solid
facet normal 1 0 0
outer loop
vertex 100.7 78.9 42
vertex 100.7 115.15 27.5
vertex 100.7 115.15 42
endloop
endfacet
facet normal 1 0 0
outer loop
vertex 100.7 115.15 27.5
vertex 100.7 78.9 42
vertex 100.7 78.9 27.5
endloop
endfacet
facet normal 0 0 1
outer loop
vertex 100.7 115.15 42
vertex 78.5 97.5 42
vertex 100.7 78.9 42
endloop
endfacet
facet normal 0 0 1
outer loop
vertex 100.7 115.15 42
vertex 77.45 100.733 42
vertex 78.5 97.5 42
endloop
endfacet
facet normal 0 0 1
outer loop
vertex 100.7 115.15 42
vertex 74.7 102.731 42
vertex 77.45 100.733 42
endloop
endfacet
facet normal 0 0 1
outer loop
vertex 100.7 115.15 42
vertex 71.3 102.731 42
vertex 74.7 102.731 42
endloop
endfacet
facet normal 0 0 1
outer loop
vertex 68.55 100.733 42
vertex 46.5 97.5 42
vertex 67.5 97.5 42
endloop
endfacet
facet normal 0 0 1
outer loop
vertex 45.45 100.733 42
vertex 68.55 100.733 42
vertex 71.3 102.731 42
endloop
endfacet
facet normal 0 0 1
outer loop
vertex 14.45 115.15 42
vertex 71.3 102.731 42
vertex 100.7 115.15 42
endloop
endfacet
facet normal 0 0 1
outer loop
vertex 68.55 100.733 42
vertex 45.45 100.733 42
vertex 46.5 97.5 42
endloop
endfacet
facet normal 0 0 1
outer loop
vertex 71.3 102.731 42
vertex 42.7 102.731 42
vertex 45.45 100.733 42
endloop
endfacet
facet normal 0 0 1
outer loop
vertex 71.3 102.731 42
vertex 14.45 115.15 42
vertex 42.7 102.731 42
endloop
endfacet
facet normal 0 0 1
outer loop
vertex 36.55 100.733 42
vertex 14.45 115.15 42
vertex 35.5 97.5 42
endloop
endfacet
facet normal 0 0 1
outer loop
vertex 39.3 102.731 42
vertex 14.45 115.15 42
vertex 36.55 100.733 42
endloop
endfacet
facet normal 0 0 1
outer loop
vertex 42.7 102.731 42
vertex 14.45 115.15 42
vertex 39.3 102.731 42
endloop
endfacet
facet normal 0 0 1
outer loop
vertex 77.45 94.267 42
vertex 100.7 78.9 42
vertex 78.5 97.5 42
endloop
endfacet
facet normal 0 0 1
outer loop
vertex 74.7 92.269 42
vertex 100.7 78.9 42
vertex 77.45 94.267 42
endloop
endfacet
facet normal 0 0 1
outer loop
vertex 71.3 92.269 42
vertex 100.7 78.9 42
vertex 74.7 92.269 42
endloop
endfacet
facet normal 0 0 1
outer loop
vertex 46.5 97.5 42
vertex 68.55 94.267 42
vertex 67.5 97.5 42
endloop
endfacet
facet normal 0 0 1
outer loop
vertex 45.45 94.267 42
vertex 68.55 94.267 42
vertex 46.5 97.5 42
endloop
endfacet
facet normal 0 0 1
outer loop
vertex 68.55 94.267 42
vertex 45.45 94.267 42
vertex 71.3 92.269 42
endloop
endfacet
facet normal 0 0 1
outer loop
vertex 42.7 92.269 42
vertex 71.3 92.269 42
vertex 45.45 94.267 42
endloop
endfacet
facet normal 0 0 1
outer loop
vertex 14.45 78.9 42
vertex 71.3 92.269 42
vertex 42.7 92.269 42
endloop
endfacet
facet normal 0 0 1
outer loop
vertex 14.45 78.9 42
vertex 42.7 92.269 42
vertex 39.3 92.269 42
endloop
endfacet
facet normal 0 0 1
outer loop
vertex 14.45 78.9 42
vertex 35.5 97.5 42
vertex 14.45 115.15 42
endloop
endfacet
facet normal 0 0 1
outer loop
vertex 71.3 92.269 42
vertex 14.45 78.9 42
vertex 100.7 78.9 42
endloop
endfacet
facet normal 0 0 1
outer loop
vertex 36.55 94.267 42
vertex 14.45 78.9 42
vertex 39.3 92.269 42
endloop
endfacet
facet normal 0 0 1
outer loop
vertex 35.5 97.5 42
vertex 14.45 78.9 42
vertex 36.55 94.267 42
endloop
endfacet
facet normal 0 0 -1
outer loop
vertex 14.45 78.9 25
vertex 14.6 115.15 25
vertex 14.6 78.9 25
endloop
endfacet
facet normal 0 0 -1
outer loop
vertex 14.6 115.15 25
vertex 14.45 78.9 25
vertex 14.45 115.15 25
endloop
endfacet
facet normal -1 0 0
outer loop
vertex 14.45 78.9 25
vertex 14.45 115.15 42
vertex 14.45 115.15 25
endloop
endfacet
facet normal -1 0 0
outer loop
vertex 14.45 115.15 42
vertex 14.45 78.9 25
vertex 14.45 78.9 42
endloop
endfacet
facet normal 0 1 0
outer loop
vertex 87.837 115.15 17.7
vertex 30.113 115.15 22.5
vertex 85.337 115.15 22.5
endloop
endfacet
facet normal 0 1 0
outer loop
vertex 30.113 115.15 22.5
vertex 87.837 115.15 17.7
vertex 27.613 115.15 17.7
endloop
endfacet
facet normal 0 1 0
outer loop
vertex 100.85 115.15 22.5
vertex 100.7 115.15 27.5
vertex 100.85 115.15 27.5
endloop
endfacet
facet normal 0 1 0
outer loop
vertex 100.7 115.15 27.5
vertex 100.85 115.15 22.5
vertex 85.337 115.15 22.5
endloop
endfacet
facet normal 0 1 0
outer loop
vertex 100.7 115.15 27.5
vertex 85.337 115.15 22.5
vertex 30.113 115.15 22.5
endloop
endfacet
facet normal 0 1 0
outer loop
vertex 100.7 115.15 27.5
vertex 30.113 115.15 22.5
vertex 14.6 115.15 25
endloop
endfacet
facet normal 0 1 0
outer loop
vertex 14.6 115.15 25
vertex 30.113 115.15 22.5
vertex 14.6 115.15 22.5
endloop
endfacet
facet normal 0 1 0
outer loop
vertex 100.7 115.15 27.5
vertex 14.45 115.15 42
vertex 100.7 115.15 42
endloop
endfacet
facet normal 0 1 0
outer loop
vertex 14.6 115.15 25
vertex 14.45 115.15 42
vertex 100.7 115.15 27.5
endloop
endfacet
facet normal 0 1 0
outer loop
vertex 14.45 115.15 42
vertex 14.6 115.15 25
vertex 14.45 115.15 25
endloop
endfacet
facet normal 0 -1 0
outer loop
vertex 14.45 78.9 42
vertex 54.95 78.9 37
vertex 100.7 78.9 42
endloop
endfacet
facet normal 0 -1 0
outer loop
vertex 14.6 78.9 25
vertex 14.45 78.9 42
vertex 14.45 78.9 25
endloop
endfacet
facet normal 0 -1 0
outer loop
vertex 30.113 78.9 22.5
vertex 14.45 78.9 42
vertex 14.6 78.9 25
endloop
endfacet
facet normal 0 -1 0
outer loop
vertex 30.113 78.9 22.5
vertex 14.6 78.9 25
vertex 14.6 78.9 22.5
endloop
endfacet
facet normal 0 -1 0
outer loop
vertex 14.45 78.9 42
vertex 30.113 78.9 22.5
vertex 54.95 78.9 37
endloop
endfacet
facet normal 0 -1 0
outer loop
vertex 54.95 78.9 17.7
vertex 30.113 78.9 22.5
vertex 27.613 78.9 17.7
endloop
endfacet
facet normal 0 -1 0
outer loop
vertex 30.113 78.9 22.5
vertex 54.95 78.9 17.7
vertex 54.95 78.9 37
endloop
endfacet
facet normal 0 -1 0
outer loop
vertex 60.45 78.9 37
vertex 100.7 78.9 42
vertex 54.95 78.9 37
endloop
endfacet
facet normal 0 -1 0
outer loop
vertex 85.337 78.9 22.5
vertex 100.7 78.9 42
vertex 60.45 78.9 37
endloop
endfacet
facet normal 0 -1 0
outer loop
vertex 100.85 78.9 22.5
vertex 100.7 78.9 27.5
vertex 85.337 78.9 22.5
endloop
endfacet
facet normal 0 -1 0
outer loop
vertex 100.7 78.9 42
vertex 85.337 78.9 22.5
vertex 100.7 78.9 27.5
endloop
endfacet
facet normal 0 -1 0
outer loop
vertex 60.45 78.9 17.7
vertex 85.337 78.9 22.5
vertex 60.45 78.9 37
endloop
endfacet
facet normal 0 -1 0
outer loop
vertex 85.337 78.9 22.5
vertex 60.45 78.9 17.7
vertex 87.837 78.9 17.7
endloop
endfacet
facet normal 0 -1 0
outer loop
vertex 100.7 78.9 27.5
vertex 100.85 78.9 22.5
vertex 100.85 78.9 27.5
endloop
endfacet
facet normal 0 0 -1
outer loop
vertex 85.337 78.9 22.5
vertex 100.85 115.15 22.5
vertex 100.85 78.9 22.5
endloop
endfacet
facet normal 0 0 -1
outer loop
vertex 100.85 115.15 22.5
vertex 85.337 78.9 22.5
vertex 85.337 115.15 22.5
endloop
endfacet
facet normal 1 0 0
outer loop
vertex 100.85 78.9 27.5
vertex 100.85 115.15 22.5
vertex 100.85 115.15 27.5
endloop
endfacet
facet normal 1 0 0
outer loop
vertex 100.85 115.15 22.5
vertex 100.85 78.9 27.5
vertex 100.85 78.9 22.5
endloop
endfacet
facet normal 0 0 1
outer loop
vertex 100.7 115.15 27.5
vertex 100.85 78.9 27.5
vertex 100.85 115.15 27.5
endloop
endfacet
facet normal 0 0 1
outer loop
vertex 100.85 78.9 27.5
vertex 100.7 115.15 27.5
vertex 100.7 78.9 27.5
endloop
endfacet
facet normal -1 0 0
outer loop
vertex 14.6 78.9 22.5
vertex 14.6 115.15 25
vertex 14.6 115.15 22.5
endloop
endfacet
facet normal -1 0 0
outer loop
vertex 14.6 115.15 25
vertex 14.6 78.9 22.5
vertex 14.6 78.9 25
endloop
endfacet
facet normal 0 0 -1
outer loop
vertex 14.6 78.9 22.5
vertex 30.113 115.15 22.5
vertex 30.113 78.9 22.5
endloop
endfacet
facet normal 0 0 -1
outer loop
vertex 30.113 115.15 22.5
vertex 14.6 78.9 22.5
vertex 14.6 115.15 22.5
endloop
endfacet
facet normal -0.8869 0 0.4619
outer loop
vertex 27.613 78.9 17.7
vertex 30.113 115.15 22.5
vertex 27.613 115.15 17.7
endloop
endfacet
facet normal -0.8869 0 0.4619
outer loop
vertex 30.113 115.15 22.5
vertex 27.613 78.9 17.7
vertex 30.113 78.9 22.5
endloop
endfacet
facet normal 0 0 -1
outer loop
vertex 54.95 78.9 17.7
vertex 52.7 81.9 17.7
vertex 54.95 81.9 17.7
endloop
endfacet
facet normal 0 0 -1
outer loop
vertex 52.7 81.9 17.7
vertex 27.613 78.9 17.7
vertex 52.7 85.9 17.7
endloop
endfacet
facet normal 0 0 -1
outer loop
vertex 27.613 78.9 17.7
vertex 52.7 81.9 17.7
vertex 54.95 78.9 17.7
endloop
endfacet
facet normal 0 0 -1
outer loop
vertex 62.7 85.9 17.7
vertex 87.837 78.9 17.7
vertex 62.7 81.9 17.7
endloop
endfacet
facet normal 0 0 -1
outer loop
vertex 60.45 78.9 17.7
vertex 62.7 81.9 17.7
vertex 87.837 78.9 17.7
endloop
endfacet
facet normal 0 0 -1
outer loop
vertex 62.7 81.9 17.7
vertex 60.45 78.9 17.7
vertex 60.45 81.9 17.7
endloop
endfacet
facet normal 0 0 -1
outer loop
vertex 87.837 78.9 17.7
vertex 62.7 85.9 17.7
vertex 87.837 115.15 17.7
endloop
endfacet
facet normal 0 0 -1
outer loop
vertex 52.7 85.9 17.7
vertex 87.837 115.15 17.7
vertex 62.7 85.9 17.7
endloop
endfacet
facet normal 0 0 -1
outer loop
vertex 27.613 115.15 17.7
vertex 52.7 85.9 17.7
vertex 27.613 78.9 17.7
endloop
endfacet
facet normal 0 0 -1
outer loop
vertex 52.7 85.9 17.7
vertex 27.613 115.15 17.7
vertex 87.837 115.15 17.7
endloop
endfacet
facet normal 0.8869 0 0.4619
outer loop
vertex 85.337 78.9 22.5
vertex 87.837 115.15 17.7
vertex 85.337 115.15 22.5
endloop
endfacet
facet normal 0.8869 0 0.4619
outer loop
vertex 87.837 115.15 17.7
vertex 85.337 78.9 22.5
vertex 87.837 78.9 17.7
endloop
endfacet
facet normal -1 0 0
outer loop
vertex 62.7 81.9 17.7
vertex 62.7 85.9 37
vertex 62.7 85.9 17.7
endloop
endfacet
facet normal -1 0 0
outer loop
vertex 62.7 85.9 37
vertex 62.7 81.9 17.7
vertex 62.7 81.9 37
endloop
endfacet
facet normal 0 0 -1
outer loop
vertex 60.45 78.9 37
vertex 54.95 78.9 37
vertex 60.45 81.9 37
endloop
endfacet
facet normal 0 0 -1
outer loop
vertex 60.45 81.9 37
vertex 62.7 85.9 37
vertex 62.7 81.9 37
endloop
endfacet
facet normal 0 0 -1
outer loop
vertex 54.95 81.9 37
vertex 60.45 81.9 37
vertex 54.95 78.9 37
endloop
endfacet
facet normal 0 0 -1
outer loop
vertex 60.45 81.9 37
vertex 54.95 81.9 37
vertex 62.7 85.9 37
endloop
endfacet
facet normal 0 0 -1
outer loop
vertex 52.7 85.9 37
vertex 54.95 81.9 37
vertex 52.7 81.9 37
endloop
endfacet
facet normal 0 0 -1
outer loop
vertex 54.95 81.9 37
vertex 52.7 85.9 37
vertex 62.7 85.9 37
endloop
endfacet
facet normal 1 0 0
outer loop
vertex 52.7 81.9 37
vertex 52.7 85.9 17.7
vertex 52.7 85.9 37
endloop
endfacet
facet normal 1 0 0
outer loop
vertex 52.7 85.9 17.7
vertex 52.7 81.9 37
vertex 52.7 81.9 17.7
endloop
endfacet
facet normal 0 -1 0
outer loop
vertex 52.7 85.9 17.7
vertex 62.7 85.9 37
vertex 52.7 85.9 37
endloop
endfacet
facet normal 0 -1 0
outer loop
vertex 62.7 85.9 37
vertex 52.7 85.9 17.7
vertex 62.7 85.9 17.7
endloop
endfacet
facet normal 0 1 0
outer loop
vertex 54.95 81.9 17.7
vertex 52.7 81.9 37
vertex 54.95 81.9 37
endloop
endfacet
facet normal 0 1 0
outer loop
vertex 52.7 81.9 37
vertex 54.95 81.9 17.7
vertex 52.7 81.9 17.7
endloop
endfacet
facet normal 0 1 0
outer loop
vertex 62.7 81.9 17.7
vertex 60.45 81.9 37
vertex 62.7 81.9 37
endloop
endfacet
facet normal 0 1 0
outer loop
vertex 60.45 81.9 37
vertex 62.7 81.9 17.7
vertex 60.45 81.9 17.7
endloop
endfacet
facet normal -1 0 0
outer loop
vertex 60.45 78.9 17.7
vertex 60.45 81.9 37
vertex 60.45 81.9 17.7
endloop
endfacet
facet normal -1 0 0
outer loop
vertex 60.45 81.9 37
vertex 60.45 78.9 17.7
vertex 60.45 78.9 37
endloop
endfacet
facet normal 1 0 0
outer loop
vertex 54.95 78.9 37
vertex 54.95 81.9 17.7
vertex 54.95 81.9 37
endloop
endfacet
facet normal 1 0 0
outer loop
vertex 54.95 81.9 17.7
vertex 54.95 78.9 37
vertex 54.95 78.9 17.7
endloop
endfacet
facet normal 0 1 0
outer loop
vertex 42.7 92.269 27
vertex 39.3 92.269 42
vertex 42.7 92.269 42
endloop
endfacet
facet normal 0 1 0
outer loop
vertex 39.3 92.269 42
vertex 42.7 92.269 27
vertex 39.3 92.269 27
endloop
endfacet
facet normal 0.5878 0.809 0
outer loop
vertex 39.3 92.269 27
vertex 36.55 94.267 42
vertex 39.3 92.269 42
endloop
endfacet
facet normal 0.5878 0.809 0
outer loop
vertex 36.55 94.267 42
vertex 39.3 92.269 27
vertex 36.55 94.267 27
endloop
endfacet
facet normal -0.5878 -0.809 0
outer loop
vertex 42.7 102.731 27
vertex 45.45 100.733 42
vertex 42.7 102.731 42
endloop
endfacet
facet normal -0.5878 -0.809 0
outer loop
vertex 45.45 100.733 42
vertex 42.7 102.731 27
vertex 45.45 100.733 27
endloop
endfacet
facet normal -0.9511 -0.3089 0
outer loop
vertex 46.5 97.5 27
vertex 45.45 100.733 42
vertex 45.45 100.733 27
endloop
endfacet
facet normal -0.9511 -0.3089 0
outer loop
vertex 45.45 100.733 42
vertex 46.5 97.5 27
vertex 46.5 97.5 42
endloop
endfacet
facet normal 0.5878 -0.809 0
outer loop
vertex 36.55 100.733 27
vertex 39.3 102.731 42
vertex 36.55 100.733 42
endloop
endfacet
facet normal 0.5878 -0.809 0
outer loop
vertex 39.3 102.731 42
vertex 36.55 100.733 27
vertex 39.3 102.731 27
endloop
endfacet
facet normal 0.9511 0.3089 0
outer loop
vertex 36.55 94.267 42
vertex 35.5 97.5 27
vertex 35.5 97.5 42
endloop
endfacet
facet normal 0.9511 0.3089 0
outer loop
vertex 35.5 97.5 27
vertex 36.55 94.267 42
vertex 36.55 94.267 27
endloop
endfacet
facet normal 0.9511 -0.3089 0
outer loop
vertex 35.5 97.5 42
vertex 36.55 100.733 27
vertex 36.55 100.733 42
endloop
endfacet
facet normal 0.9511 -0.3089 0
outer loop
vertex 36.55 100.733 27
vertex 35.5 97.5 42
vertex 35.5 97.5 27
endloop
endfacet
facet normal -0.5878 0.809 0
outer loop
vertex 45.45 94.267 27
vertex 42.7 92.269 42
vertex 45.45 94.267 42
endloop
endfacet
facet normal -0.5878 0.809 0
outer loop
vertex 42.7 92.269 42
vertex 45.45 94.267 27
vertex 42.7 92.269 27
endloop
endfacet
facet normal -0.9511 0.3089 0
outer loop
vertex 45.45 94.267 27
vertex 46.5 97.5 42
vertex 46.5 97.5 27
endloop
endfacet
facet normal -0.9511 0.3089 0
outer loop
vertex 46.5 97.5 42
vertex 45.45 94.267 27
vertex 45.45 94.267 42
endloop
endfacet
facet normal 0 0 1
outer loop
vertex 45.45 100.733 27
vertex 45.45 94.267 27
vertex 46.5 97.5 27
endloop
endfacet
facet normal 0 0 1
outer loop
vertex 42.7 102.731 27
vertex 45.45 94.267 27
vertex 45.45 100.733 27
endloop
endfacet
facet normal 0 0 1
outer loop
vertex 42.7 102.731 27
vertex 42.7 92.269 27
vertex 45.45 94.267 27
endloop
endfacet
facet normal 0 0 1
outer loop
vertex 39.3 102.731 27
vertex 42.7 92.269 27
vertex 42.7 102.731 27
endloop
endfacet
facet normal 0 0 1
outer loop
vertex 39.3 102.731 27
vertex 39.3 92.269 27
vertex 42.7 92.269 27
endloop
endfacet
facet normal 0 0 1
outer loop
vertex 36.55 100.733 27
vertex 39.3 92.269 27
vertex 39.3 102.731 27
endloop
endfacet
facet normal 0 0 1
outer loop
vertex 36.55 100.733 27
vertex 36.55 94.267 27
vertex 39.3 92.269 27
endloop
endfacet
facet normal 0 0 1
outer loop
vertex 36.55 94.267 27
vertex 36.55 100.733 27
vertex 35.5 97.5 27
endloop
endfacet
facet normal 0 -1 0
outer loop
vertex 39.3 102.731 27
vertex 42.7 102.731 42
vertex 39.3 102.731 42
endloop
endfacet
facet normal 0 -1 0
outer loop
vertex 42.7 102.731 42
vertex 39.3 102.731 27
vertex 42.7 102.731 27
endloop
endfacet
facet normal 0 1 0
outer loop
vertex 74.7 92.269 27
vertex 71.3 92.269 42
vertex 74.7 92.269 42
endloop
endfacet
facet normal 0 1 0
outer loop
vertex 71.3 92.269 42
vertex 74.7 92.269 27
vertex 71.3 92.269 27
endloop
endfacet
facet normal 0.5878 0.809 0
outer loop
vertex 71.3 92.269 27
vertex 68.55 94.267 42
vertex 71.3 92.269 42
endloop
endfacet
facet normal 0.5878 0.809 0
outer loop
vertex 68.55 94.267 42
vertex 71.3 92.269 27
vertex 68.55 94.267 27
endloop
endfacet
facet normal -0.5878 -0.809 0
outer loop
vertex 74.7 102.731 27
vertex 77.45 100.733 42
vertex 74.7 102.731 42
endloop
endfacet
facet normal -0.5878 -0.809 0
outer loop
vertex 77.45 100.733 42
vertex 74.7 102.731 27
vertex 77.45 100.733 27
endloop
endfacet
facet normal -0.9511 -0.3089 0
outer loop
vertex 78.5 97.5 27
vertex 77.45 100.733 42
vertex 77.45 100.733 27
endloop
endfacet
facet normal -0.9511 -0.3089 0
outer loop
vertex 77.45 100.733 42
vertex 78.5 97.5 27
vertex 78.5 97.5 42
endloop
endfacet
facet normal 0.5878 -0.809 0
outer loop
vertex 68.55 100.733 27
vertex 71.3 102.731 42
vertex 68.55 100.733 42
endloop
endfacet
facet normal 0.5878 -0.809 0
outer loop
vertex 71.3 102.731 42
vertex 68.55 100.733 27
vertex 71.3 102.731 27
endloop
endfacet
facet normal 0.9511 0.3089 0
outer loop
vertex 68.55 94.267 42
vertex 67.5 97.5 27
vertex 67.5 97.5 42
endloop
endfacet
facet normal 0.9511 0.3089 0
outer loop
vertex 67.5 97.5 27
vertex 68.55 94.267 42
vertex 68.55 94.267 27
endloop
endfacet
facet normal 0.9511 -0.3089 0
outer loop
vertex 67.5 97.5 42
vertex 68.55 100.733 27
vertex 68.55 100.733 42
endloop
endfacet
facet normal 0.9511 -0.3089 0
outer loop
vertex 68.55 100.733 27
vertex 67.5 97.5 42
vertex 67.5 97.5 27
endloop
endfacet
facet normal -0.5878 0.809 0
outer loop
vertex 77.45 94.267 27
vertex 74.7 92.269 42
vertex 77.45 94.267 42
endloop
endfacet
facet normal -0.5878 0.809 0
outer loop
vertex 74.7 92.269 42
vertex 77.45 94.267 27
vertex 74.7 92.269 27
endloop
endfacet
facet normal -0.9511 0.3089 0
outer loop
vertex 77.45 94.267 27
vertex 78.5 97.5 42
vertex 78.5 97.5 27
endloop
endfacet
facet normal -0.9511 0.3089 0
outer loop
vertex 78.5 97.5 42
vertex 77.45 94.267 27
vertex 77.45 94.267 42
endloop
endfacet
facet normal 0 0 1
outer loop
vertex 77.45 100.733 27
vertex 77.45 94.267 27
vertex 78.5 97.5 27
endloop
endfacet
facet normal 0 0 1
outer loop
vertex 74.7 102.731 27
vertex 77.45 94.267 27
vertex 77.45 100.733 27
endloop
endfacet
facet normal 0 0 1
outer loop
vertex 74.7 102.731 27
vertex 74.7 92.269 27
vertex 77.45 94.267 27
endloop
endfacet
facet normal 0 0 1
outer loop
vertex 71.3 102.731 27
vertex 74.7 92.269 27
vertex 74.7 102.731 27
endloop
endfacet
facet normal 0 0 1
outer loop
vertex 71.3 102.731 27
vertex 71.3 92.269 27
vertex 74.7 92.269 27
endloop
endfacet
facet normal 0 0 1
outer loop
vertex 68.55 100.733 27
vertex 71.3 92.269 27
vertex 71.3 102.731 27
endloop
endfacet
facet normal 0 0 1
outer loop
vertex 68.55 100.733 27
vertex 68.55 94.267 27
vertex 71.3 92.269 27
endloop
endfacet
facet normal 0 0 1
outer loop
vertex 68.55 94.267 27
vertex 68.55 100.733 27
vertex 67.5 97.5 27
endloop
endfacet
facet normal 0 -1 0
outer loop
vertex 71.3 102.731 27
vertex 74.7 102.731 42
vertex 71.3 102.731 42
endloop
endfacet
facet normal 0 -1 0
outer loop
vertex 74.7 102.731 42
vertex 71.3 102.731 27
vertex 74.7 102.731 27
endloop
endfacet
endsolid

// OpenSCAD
//-----Rabo de Andorinha Cima (Eixo Y) / Rabo de Andorinha Baixo (Eixo X)-----//

//-----Declaração de Variáveis-----//
r=3;
d=25;
h=9;
nx=5;
ny=5;
geo=1;
res=10;
aux=2*d+15.15;
aux2=40.7-24.2+111.70-16.7-5.15/2;
aux3=11/2;
aux4=(37.55+4)/2 - (16.35+5.1/2-13.2);
cc=25;
ff=37.5;
gg=0.2;
shift=(17.5+2*d)/2;
shift2=(17.5)/2;
h_alt=11/2;
hip=h_alt/(sin(60));
o_ext=d*0.75+2*shift; // Segundo rabo de andorinha
o_ext2=2*shift2+d*0.75; //Primeiro rabo de andorinha

//-----Declaração de Funções-----//
module funcao_2d_array_cilindros(r,d,h,nx,ny,geo,res){
    //-----FUNÇÃO ARRAY 2D DE CILÍNDROS-----//
    /*
    Forneça:
        raio dos cilíndros: r
        distância entre os centros de cada cilíndro: d
        altura dos cilíndros: h
        quantidade de cilíndros em ambas as direções: nx, ny
        resolução dos cilíndros: res
    Selecione a geometria:
         Retangular: 1
         Hexagonal: 2
    
    Quantidade de cilíndros = nx*ny
    geo=1 => Dimensões: [(nx-1)*d+2*r,(ny-1)*d+2*r,h]
    geo=2 => Dimensões: [(nx-1+cos(60))*d+2*r,(ny-1)*d*sin(60)+2*r,h]
    */
    if (d<2*r){
        text("Error!");
        translate([0,-15,0])text("Verify your specified dimensions.");
    }else{
        if(geo==1){
            for(j=[0:1:ny-1]){
                for(i=[0:1:nx-1]){
                    translate([i*d,j*d,0])cylinder(h,r,r,$fn=res);
                }
            }
        }else if(geo==2){
            for(j=[0:1:ny-1]){
                for(i=[0:1:nx-1]){
                    translate([i*d+(j%2)*d*cos(60),j*d*sin(60),0])cylinder(h,r,r,$fn=res);
                }
            }
        }else{
            text("Error!");
            translate([0,-15,0])text("Please, choose a valid geometry number.");
        }
        
    }    
}

//-----Rabo de Andorinha Eixo Y-----//
//-----Translação no Eixo X (d mm)-----//
translate([d,0,0]){
    //-----Rabo de Andorinha Cima (Eixo Y)-----//
    difference(){
        translate([0,0,0]){
            translate([aux/2-shift-(d*0.75)/2,4*d+5.15+10-o_ext2,25])cube([o_ext,2*shift2+d*0.75,42-25]);
            translate([7.725,4*d+5.15+10,-17.5])rotate([90,0,0])linear_extrude(o_ext2)polygon(points=[[35+shift-(20-(d*0.75))/2,45],[35+shift-(20-(d*0.75))/2,40],[27.5-        gg+shift*0.75,40],[30-gg+shift*0.75,35+gg],[20+gg-shift*0.75,35+gg],[22.5+gg-shift*0.75,40],[15-shift+(20-(d*0.75))/2,40],[15-shift+(20-(d*0.75))/2,45]]);
        }
        #translate([-17.3,0,0])translate([50-5,4*d+5.15+10-o_ext2+3,0])cube([10,4,37]);
        #translate([-17.3,0,0])translate([50-5.5/2,4*d+5.15+10-o_ext2,0])cube([5.5,4,37]);
        #translate([41-d,97.5,30-3])cylinder(12+4,5.5,5.5,$fn=res);
        #translate([41+32-d,97.5,30-3])cylinder(12+4,5.5,5.5,$fn=res);
    }
};
